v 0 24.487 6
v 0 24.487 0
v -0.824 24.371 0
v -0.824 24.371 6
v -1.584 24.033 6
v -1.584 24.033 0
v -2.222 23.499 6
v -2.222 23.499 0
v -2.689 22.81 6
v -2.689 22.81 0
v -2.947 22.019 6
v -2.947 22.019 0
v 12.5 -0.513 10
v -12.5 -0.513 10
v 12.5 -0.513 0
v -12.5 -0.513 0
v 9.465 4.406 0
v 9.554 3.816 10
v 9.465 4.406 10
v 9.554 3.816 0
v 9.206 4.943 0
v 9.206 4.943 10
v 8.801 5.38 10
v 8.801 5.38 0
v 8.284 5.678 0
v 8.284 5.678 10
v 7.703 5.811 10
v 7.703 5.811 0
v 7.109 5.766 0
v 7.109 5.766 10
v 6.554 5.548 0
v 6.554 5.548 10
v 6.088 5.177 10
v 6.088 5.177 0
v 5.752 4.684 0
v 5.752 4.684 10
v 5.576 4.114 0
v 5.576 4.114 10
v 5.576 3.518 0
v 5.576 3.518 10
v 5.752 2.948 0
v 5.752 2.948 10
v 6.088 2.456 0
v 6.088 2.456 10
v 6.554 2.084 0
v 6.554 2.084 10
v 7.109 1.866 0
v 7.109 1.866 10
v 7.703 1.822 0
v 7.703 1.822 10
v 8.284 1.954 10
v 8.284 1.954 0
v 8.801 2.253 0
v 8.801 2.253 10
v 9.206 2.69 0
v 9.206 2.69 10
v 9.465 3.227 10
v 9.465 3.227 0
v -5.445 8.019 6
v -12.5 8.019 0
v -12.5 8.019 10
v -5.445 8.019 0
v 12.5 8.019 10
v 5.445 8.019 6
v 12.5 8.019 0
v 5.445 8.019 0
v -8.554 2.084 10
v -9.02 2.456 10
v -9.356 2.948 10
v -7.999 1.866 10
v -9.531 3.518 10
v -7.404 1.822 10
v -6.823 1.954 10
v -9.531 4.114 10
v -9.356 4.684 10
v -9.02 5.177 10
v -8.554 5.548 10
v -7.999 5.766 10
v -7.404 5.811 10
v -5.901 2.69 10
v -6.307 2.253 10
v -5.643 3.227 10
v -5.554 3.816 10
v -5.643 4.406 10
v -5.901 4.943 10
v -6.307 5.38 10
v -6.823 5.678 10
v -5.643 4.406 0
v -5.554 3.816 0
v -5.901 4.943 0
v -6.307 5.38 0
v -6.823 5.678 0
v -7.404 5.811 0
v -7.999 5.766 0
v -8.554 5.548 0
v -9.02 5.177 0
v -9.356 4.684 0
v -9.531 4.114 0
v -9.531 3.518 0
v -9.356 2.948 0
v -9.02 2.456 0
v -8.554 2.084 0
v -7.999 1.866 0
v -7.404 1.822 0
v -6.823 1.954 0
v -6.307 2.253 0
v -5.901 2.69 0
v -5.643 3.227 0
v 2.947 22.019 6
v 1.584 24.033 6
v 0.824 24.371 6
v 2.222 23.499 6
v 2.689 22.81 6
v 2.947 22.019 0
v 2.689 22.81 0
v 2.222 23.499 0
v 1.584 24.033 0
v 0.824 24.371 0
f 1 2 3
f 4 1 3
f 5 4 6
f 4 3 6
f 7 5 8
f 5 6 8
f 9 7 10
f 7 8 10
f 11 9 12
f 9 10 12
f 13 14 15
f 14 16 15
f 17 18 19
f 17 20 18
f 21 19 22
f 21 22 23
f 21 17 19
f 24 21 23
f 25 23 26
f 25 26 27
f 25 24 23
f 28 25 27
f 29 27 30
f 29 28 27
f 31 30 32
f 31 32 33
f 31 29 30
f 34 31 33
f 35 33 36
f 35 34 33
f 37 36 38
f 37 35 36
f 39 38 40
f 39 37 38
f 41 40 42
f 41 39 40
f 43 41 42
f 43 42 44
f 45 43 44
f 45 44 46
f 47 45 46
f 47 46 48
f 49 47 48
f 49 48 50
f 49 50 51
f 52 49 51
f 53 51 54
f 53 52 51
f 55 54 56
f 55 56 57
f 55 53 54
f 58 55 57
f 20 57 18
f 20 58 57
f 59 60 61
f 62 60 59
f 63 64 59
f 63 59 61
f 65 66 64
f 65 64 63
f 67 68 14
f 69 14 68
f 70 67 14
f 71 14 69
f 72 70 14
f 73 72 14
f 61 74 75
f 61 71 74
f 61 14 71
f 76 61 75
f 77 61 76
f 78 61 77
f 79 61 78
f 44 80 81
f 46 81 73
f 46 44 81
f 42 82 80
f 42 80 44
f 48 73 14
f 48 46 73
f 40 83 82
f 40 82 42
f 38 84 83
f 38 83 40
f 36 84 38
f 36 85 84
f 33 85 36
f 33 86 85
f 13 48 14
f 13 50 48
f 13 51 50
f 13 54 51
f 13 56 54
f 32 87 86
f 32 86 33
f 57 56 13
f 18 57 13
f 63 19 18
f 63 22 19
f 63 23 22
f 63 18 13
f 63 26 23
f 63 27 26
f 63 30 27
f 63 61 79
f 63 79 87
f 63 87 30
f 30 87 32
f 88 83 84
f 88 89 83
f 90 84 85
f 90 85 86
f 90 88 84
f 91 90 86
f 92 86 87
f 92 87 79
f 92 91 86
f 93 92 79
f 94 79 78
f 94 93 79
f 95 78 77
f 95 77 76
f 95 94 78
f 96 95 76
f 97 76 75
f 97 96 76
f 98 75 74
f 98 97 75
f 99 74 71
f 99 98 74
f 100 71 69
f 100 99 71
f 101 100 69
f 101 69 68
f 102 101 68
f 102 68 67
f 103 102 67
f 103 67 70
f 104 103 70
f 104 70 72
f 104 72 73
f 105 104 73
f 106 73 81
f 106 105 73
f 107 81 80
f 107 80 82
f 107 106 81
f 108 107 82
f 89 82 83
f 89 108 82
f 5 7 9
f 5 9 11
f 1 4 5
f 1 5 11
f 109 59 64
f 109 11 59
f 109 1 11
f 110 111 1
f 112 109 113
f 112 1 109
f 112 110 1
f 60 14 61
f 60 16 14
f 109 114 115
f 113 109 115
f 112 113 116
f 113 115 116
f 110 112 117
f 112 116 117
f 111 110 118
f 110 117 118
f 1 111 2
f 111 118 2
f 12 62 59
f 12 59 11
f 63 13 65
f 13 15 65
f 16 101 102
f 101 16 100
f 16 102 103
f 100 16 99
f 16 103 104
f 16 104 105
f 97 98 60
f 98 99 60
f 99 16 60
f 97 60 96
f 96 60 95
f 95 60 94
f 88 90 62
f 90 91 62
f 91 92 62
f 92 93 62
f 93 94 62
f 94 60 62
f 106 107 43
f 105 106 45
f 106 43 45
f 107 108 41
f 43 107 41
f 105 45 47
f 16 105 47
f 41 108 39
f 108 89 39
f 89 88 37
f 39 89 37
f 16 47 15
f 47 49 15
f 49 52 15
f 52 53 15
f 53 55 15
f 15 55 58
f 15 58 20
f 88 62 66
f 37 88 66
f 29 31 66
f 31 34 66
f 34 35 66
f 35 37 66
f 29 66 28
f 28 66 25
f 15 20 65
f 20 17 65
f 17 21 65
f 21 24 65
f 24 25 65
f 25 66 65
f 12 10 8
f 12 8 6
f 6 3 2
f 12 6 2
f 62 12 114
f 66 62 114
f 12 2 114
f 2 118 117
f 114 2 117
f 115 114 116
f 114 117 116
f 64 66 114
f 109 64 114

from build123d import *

# Parameters (mm, degrees)
SKETCH001_R  = 2
PAD_DEPTH    = 6
SKETCH_W     = 25
SKETCH_H     = 8.532326
SKETCH_R     = 2
PAD001_DEPTH = 4


with BuildPart() as part:
    # Sketch001 → Pad (new body)
    with BuildSketch(Plane.XY):
        with BuildLine():
            Line((0, -0.513451), (12.5, -0.513451))
            Line((12.5, -0.513451), (12.5, 8.018875))
            Line((12.5, 8.018875), (5.444822, 8.018875))
            Line((5.444822, 8.018875), (2.947073, 22.018734))
            ThreePointArc((2.947073, 22.018734), (1.921936, 23.788122), (0, 24.486549))
            ThreePointArc((0, 24.486549), (-1.921936, 23.788122), (-2.947073, 22.018734))
            Line((-5.444822, 8.018875), (-2.947073, 22.018734))
            Line((-12.5, 8.018875), (-5.444822, 8.018875))
            Line((-12.5, -0.513451), (-12.5, 8.018875))
            Line((0, -0.513451), (-12.5, -0.513451))
        make_face()
        with Locations((-7.553649, 3.816244)):
            Circle(SKETCH001_R, mode=Mode.SUBTRACT)
        with Locations((7.553649, 3.816244)):
            Circle(SKETCH001_R, mode=Mode.SUBTRACT)
    extrude(amount=PAD_DEPTH)

    # Sketch → Pad001 (new body)
    with BuildSketch(Plane.XY.offset(6)):
        with Locations((0, 3.752712)):
            Rectangle(SKETCH_W, SKETCH_H)
        with Locations((-7.553649, 3.816244)):
            Circle(SKETCH_R, mode=Mode.SUBTRACT)
        with Locations((7.553649, 3.816244)):
            Circle(SKETCH_R, mode=Mode.SUBTRACT)
    extrude(amount=PAD001_DEPTH)


solid = part.part
